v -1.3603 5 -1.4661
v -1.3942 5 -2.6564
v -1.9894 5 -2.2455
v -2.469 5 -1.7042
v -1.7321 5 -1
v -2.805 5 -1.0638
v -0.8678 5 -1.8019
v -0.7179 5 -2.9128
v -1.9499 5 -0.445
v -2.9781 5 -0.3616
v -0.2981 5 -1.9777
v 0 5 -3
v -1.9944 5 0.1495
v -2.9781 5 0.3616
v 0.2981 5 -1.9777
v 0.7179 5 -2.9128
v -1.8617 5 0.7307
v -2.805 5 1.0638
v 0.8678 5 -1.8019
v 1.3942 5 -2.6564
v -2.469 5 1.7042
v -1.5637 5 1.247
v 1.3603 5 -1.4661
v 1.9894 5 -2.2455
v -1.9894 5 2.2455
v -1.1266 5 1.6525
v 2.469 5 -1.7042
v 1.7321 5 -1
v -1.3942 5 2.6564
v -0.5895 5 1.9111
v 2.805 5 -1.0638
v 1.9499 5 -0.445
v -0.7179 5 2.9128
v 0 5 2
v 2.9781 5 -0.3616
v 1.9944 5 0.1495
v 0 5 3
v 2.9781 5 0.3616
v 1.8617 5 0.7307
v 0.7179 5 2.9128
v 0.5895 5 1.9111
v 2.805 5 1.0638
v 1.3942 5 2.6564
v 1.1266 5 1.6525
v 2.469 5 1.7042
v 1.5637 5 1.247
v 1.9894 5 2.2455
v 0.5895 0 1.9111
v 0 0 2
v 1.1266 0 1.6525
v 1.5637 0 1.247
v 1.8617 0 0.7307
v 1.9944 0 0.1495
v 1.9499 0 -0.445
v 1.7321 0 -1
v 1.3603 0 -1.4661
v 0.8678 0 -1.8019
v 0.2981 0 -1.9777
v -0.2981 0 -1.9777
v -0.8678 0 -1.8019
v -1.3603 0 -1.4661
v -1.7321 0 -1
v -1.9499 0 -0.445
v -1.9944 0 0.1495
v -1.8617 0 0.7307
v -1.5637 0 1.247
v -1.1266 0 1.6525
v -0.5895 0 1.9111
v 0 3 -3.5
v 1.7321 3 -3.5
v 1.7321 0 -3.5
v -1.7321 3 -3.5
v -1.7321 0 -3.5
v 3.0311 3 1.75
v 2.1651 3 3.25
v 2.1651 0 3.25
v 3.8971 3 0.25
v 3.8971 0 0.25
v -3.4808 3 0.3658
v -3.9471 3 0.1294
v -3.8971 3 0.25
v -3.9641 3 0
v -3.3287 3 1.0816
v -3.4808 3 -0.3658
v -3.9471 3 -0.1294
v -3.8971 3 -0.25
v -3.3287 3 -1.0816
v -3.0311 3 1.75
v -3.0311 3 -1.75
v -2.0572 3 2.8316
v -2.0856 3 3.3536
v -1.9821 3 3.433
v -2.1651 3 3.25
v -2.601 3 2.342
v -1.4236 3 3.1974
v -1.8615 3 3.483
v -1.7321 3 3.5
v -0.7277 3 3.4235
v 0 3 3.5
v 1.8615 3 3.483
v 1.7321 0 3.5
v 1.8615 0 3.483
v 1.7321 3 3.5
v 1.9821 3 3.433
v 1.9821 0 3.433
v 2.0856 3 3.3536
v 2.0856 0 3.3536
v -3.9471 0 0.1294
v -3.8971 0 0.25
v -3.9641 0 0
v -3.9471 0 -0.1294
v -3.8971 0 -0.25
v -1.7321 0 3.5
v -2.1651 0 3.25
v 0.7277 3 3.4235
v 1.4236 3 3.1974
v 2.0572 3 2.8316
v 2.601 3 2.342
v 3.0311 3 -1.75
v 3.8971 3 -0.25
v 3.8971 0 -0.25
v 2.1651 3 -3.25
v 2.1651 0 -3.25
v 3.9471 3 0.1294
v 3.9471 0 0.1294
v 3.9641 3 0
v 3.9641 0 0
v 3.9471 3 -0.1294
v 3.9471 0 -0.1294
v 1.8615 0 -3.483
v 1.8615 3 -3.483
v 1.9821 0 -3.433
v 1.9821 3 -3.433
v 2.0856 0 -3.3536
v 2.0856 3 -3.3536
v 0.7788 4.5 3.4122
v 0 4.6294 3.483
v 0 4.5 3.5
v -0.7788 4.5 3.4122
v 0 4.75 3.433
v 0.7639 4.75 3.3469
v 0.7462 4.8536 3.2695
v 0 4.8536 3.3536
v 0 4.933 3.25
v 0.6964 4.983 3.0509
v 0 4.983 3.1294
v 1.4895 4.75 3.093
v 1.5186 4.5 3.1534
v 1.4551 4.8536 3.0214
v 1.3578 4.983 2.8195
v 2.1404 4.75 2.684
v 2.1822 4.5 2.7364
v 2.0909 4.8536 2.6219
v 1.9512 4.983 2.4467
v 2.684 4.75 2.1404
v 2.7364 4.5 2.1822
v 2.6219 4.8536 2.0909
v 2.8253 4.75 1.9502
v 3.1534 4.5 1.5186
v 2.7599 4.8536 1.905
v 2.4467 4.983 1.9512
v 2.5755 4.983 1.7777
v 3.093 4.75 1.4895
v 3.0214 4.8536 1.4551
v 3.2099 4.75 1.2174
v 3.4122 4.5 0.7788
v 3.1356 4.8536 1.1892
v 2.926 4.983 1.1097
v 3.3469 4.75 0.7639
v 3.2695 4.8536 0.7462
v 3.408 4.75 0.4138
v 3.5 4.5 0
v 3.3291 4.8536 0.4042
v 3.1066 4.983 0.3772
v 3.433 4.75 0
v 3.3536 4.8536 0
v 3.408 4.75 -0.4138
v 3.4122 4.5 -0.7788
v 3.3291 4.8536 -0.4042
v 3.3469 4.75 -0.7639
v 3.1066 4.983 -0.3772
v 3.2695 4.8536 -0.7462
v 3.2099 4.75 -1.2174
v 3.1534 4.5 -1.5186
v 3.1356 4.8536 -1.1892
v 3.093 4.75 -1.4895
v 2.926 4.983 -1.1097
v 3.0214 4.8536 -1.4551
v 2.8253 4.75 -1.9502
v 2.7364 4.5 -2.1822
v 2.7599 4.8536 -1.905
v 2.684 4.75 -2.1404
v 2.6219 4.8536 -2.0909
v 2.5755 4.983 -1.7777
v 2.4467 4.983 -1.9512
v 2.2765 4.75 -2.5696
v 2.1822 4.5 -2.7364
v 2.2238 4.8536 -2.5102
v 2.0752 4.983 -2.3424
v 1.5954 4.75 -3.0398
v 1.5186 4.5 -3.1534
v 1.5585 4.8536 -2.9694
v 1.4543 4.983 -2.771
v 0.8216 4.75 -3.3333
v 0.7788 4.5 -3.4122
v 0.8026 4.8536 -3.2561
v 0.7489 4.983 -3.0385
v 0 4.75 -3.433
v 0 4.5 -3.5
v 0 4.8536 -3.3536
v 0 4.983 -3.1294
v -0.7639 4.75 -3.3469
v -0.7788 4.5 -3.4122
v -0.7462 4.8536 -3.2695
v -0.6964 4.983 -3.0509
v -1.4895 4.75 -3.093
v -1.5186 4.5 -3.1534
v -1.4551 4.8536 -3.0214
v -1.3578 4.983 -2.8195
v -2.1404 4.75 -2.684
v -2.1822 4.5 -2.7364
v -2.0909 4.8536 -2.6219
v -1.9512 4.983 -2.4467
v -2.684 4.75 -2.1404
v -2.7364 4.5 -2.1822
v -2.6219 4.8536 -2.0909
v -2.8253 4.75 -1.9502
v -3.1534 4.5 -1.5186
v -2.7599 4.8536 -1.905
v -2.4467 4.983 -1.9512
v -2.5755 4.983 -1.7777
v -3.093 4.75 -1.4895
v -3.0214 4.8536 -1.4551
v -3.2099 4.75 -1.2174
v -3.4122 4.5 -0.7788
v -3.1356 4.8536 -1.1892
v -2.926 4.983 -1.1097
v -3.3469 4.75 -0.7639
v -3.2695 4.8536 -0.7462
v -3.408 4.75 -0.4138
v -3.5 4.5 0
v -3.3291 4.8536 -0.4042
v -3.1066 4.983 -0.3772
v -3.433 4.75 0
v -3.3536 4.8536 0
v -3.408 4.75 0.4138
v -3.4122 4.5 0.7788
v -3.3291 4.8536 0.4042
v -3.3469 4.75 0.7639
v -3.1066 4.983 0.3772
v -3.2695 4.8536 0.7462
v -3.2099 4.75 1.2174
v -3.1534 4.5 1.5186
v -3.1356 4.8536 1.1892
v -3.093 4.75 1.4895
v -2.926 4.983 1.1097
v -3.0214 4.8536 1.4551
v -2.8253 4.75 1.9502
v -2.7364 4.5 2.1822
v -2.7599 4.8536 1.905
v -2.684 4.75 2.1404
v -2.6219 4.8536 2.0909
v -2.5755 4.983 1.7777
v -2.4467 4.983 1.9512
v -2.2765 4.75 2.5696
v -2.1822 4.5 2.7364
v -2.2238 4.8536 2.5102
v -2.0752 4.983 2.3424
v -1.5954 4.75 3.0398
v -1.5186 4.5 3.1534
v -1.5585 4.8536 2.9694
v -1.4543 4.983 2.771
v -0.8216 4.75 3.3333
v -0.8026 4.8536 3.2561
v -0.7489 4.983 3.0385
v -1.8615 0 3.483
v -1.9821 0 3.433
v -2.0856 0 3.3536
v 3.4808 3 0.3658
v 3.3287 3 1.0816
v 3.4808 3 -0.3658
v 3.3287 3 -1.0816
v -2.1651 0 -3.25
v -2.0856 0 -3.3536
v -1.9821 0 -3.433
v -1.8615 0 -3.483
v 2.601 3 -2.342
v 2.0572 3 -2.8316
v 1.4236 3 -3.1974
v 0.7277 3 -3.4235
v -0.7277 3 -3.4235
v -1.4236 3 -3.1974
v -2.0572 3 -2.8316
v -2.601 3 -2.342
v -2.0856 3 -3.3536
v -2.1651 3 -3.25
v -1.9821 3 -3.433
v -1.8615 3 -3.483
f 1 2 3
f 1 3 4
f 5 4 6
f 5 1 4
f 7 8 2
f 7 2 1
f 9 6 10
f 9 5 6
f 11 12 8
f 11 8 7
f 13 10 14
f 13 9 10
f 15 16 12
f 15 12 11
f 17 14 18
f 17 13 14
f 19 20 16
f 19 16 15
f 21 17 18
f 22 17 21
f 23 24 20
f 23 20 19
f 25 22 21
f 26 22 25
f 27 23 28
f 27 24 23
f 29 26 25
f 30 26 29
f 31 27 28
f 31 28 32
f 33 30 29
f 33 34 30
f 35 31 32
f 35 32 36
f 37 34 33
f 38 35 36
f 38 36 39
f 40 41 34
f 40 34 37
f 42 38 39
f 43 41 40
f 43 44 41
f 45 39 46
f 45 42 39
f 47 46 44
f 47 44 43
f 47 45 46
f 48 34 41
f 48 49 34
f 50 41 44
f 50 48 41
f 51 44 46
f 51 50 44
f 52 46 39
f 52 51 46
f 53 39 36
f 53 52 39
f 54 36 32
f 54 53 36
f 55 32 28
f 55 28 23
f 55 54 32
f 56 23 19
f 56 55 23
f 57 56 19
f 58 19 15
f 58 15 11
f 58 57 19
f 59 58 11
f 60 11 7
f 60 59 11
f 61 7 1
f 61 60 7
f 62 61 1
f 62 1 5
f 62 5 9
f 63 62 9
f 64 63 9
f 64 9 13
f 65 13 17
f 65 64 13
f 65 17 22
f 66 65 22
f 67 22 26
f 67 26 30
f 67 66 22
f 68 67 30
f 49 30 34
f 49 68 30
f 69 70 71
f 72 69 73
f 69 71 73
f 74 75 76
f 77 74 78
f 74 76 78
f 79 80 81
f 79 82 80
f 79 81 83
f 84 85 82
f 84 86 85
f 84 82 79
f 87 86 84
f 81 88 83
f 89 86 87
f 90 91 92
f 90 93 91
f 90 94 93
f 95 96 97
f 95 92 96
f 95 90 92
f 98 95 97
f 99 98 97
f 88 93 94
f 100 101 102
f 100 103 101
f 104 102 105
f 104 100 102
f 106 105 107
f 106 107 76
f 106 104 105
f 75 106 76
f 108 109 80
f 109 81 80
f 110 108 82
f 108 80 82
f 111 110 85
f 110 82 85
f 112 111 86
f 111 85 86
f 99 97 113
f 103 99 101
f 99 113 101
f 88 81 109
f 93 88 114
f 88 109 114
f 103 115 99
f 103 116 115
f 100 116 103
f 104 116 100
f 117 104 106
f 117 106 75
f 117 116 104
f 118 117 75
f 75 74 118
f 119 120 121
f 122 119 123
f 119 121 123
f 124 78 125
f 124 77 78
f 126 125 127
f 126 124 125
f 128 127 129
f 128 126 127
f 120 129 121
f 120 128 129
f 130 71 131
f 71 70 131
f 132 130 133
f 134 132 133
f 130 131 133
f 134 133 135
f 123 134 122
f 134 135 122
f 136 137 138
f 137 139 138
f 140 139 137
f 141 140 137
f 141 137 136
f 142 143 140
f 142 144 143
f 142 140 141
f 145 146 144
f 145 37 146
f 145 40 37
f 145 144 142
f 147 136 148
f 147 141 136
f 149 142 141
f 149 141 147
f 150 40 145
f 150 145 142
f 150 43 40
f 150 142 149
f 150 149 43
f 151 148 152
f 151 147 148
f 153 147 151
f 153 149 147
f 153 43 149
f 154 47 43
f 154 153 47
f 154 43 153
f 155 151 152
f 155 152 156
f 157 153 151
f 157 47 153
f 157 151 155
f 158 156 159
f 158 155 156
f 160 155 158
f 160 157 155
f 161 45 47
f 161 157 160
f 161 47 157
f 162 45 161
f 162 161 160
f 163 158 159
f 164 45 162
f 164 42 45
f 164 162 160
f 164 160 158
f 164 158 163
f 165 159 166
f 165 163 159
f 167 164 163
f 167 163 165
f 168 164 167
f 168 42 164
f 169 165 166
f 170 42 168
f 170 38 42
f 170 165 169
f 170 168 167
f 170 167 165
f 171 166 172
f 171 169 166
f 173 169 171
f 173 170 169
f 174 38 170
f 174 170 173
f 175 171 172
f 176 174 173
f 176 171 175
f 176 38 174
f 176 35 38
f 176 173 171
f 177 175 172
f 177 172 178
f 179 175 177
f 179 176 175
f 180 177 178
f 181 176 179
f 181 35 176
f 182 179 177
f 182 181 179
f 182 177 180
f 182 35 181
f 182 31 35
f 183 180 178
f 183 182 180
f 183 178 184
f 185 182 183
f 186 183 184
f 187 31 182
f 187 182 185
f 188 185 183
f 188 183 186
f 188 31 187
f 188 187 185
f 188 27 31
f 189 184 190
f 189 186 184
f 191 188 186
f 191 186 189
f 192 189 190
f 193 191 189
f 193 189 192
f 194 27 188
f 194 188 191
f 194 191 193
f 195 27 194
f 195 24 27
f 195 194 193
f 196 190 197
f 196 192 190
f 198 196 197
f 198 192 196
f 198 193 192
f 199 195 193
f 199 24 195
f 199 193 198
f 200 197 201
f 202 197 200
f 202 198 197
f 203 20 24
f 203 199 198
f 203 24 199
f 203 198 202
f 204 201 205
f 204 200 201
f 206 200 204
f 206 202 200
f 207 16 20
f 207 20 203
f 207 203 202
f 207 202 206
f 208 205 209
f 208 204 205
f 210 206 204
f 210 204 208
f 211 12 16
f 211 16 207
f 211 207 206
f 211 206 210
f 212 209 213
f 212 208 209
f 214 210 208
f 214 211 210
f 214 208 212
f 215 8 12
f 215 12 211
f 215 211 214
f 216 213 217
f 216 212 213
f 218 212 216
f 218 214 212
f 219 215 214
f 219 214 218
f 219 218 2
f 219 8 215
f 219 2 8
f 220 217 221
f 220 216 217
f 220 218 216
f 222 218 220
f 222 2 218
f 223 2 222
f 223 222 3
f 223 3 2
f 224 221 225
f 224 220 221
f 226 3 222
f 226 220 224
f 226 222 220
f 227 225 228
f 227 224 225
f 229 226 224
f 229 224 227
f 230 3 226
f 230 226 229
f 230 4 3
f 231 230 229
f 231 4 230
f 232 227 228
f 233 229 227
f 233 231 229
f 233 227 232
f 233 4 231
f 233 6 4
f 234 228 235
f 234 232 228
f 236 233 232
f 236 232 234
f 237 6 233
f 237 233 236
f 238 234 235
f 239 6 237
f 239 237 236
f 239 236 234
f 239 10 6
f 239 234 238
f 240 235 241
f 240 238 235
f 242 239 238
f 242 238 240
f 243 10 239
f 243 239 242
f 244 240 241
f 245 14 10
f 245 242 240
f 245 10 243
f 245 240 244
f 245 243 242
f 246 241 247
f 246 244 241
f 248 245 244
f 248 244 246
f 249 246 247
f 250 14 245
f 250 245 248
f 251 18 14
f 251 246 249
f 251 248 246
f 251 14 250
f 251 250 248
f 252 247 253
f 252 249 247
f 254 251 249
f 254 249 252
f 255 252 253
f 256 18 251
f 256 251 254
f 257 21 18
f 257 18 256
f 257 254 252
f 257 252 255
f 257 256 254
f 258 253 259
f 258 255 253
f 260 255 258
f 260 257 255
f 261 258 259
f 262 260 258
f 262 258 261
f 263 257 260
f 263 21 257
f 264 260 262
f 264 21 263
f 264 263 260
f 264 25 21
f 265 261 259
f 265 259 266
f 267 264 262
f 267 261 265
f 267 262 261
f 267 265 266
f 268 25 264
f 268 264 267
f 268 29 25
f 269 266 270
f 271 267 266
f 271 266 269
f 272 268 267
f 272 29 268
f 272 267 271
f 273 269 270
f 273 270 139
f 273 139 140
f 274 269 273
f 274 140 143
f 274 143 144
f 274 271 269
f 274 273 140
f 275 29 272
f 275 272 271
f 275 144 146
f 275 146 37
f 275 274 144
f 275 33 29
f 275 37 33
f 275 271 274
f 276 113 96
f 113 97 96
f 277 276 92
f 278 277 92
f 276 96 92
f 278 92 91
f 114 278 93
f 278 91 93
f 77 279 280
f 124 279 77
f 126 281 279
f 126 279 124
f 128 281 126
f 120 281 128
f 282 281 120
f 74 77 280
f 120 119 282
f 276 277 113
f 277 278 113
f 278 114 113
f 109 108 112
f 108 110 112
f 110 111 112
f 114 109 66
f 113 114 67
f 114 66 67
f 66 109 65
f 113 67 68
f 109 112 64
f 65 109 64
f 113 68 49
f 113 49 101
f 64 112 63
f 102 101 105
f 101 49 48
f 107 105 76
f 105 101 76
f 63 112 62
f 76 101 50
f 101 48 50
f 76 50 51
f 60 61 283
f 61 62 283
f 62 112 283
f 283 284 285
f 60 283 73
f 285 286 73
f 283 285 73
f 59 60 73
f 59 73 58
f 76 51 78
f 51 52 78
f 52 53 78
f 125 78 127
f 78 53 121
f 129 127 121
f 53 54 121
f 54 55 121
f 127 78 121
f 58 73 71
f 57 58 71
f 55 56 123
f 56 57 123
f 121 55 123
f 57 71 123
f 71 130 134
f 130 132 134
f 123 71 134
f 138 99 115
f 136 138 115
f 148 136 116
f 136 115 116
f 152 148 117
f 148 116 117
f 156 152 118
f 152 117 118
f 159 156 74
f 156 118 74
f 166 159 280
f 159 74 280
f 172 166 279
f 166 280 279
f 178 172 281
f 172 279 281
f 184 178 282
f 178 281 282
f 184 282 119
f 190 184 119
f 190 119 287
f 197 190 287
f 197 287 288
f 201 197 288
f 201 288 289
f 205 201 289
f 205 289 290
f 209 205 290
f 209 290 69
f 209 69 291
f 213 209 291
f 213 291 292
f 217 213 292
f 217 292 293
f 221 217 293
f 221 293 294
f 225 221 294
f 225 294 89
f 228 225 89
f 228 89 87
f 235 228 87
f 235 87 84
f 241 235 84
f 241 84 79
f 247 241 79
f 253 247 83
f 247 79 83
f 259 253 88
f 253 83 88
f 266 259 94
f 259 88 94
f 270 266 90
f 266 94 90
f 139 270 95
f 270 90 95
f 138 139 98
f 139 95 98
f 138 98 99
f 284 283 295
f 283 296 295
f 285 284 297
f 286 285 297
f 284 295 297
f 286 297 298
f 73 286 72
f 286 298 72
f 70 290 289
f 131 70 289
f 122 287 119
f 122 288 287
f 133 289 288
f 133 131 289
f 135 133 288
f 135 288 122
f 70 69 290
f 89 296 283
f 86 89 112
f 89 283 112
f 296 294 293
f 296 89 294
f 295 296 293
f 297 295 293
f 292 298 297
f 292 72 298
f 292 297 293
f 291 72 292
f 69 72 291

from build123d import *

# Parameters (mm, degrees)
SKETCH2_R           = 2
BOSS_EXTRUDE1_DEPTH = 3
SKETCH6_R           = 3.5
SKETCH6_R_2         = 2
BOSS_EXTRUDE2_DEPTH = 2
FILLET1_R           = 0.5
FILLET4_R           = 0.5


with BuildPart() as part:
    # Sketch2 → Boss-Extrude1 (new body)
    with BuildSketch(Plane(origin=(0, 0, 0), x_dir=(1, 0, 0), z_dir=(0, 1, 0))):
        Polygon((4.041451884, 0), (2.020725942, 3.5), (-2.020725942, 3.5), (-4.041451884, 0), (-2.020725942, -3.5), (2.020725942, -3.5), align=None)
        with Locations(Location((0, 0, 0), (0, 0, 270))):
            Circle(SKETCH2_R, mode=Mode.SUBTRACT)
    extrude(amount=BOSS_EXTRUDE1_DEPTH)

    # Sketch6 → Boss-Extrude2 (add)
    with BuildSketch(Plane(origin=(0, 3, 0), x_dir=(1, 0, 0), z_dir=(0, 1, 0))):
        with Locations(Location((0, 0, 0), (0, 0, 270))):
            Circle(SKETCH6_R)
        with Locations(Location((0, 0, 0), (0, 0, 270))):
            Circle(SKETCH6_R_2, mode=Mode.SUBTRACT)
    extrude(amount=BOSS_EXTRUDE2_DEPTH)

    # Fillet1
    fillet1_edges = [part.edges().sort_by_distance(p)[0] for p in [
        (0, 5, -3.5),
    ]]
    fillet(fillet1_edges, radius=FILLET1_R)

    # Fillet4
    fillet4_edges = [part.edges().sort_by_distance(p)[0] for p in [
        (2.020725942, 1.5, 3.5),
        (-2.020725942, 1.5, 3.5),
        (-4.041451884, 1.5, 0),
        (-2.020725942, 1.5, -3.5),
        (2.020725942, 1.5, -3.5),
        (4.041451884, 1.5, 0),
    ]]
    fillet(fillet4_edges, radius=FILLET4_R)


solid = part.part
